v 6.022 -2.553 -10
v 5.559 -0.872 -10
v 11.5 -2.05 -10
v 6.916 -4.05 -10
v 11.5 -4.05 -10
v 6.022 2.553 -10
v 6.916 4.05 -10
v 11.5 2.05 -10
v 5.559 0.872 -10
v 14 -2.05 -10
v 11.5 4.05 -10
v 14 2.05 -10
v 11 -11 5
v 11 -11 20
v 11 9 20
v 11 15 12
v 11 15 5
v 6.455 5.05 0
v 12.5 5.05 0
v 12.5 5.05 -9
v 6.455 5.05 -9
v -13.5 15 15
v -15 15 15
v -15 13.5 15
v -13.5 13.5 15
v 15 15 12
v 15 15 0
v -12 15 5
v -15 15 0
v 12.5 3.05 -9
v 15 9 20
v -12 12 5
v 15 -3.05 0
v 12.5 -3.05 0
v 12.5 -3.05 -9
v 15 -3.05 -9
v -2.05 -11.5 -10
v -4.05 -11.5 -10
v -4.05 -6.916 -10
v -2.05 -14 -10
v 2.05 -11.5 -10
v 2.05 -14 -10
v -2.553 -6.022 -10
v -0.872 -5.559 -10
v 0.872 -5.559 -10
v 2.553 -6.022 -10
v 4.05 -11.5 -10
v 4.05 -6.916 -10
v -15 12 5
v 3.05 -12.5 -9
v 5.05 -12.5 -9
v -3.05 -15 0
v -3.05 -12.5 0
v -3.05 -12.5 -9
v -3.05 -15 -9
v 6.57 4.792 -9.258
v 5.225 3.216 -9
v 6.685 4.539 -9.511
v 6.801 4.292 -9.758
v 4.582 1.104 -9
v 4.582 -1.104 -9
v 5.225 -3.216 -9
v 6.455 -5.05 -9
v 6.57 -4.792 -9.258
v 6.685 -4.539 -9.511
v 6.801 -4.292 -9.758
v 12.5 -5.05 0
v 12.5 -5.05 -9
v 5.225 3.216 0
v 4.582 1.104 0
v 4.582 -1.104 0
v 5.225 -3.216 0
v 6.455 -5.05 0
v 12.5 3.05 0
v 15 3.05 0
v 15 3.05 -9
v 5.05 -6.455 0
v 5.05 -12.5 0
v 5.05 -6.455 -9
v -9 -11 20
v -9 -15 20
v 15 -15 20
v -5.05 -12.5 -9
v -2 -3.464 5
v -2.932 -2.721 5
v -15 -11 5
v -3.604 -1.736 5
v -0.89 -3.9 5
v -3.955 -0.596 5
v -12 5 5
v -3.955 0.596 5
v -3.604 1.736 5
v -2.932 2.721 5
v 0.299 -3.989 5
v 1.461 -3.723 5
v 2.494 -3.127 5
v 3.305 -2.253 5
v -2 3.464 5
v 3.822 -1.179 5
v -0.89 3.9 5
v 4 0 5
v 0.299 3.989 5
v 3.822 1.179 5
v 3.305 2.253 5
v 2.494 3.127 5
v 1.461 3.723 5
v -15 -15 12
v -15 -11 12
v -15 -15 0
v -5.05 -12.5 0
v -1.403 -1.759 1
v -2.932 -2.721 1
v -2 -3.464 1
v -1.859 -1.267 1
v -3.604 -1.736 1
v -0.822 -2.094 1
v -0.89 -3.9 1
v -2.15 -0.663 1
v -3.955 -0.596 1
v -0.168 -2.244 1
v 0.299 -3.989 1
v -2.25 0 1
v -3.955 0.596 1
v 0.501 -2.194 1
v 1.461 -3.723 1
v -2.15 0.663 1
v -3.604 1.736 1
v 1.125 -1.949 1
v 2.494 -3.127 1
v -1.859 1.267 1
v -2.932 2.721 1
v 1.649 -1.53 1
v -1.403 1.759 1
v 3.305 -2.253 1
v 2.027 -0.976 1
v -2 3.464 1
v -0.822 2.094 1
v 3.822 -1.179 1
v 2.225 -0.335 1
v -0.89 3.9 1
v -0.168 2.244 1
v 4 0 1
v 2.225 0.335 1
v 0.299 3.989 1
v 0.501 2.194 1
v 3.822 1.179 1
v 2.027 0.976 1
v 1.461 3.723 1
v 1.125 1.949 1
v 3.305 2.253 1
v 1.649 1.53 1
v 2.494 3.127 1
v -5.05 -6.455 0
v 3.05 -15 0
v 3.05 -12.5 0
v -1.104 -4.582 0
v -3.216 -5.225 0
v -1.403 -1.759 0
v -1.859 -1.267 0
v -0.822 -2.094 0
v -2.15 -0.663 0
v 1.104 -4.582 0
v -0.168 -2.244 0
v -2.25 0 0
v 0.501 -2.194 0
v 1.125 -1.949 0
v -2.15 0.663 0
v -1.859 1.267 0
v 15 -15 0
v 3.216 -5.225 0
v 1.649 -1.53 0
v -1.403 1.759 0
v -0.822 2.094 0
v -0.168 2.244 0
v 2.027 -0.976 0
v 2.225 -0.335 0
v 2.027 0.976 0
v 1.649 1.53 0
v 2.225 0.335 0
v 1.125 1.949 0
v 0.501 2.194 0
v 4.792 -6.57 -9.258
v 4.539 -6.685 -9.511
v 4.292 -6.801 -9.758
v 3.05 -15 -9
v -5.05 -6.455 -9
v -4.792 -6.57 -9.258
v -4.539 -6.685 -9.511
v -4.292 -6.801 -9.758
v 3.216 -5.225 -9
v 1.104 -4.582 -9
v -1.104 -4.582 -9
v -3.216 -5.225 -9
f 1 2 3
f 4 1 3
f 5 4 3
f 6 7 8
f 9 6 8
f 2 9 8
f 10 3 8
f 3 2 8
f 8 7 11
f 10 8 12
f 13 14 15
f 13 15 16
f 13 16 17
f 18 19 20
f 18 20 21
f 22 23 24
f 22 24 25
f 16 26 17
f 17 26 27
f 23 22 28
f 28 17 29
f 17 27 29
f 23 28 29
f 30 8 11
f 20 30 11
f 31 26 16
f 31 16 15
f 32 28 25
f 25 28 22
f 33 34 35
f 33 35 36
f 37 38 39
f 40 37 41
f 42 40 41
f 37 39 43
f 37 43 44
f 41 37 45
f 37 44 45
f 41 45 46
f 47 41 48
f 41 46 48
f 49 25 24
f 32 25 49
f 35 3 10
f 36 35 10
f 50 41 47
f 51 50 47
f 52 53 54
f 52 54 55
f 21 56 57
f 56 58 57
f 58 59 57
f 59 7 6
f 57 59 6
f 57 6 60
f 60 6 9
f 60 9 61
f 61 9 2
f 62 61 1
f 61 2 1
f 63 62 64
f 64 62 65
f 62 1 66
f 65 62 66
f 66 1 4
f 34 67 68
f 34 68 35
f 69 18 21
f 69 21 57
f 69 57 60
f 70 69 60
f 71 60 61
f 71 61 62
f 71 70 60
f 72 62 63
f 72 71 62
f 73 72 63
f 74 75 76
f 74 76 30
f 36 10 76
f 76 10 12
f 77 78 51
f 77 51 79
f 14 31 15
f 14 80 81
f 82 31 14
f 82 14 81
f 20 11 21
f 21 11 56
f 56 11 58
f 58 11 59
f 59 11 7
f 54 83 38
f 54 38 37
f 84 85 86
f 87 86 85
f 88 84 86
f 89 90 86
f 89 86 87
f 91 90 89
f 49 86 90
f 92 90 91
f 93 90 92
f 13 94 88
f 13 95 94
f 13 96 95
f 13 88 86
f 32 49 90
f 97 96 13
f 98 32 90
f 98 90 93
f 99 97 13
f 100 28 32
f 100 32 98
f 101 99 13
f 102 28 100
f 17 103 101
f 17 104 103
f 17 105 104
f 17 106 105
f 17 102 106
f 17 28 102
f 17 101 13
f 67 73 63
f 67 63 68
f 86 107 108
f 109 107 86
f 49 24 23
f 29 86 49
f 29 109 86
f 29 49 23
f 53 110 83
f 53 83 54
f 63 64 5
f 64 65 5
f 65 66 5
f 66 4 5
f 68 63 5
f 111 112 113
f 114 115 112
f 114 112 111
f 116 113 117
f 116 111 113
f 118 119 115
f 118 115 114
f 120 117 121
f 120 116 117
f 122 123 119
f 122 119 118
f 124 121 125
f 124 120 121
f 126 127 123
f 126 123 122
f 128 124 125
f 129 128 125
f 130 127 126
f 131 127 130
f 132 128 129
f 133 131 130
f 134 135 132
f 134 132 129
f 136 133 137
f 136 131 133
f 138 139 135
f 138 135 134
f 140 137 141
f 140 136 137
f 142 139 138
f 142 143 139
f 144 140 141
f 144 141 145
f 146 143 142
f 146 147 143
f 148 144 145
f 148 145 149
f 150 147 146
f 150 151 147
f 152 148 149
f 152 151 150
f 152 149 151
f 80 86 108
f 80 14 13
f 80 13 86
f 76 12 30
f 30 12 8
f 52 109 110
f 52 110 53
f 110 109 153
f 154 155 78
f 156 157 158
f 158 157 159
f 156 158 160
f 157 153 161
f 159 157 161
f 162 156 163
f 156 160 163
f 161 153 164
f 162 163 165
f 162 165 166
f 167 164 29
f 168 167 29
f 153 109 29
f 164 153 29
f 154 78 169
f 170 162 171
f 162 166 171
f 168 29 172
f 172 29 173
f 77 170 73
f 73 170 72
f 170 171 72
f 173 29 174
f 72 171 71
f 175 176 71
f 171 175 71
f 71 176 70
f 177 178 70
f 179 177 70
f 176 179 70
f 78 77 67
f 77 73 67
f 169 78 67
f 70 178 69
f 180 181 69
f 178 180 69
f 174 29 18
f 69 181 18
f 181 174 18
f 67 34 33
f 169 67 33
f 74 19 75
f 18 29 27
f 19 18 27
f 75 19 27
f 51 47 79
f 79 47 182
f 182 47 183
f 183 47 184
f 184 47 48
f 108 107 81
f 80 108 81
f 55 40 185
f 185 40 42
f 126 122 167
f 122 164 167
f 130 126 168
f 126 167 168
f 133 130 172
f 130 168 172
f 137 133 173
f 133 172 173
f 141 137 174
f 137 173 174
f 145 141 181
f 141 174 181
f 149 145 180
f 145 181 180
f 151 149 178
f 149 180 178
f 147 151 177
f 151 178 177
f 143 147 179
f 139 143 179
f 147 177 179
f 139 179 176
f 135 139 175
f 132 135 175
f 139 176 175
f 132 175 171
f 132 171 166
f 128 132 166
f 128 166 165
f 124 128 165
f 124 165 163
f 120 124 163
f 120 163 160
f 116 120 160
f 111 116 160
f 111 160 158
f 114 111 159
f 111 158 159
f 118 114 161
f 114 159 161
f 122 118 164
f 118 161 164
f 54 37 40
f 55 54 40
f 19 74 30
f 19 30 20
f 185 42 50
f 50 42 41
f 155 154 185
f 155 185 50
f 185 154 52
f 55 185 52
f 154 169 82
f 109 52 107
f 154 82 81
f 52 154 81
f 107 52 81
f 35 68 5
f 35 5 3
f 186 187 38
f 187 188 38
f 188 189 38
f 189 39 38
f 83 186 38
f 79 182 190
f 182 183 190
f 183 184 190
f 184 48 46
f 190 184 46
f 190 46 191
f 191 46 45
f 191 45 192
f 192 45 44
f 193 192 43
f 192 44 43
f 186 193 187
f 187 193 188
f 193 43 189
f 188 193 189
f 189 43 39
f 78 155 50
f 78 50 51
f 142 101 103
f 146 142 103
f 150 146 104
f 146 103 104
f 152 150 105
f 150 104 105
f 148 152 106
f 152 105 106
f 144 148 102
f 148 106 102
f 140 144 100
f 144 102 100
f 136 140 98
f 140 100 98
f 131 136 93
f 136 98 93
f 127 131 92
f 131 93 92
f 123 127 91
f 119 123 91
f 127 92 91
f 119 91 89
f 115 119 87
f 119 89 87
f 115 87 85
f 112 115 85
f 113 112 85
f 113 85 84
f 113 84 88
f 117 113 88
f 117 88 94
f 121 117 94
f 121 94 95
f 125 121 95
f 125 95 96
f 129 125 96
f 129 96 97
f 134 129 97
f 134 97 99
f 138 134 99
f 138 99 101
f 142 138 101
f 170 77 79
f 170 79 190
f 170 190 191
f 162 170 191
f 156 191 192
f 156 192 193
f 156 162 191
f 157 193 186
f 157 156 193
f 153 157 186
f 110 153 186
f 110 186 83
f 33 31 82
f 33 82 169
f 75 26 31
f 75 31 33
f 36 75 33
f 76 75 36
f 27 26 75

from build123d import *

# Parameters (mm, degrees)
SKETCH_1_W                   = 30
SKETCH_1_H                   = 30
EXTRUDE_1_DEPTH              = 5
SKETCH_2_W                   = 3
SKETCH_2_H                   = 3
EXTRUDE_2_DEPTH              = 10
EXTRUDE_3_DEPTH              = 7
CUT_EXTRUDE_1_DEPTH          = 10
CUT_EXTRUDE_2_DEPTH          = 10
HOLE_WIZARD_M4_1_D           = 4.5
HOLE_WIZARD_M4_1_CBORE_D     = 8
HOLE_WIZARD_M4_1_CBORE_DEPTH = 4
EXTRUDE_4_DEPTH              = 10
CHAMFER_1_SIZE               = 1
CUT_EXTRUDE_4_DEPTH          = 10
EXTRUDE_5_DEPTH              = 4
EXTRUDE_6_DEPTH              = 4


with BuildPart() as part:
    # 스케치1 → 보스-돌출1 (new body)
    with BuildSketch(Plane.XY):
        Rectangle(SKETCH_1_W, SKETCH_1_H)
    extrude(amount=EXTRUDE_1_DEPTH)

    # 스케치2 → 보스-돌출2 (add)
    with BuildSketch(Plane.XY.offset(5)):
        with Locations((-13.5, 13.5)):
            Rectangle(SKETCH_2_W, SKETCH_2_H)
    extrude(amount=EXTRUDE_2_DEPTH)

    # 스케치2<3> → 보스-돌출3 (add)
    with BuildSketch(Plane.XY.offset(5)):
        Polygon((15, 15), (11, 15), (11, -11), (-15, -11), (-15, -15), (15, -15), align=None)
    extrude(amount=EXTRUDE_3_DEPTH)

    # 스케치3 → 컷-돌출1 (cut)
    with BuildSketch(Plane(origin=(-12, 0, 0), x_dir=(0, 0, -1), z_dir=(1, 0, 0))):
        Polygon((-15, 13.5), (-5, 12), (-15, 12), align=None)
    extrude(amount=-CUT_EXTRUDE_1_DEPTH, mode=Mode.SUBTRACT)

    # 스케치4 → 컷-돌출2 (cut)
    with BuildSketch(Plane(origin=(0, 15, 0), x_dir=(1, 0, 0), z_dir=(0, 1, 0))):
        Polygon((-12, -15), (-12, -5), (-13.5, -15), align=None)
    extrude(amount=-CUT_EXTRUDE_2_DEPTH, mode=Mode.SUBTRACT)

    # M4 소켓 머리 캡 나사용 카운터보어1 (through all)
    with Locations(Plane.XY.offset(5)):
        with Locations((0, 0)):
            CounterBoreHole(HOLE_WIZARD_M4_1_D / 2, HOLE_WIZARD_M4_1_CBORE_D / 2, HOLE_WIZARD_M4_1_CBORE_DEPTH)

    # 스케치8 → 보스-돌출4 (add)
    with BuildSketch(Plane(origin=(0, 0, 0), x_dir=(-1, 0, 0), z_dir=(0, 0, -1))):
        with BuildLine():
            Line((-3.05, 15), (3.05, 15))
            Line((3.05, 15), (3.05, 12.5))
            Line((3.05, 12.5), (5.05, 12.5))
            Line((5.05, 12.5), (5.05, 6.454957169))
            ThreePointArc((5.05, 6.454957169), (0, 4.5), (-5.05, 6.454957169))
            Line((-5.05, 6.454957169), (-5.05, 12.5))
            Line((-5.05, 12.5), (-3.05, 12.5))
            Line((-3.05, 12.5), (-3.05, 15))
        make_face()
        with BuildLine():
            Line((15, 3.05), (15, -3.05))
            Line((15, -3.05), (12.5, -3.05))
            Line((12.5, -3.05), (12.5, -5.05))
            Line((12.5, -5.05), (6.454957169, -5.05))
            ThreePointArc((6.454957169, -5.05), (4.5, 0), (6.454957169, 5.05))
            Line((6.454957169, 5.05), (12.5, 5.05))
            Line((12.5, 5.05), (12.5, 3.05))
            Line((12.5, 3.05), (15, 3.05))
        make_face()
        with BuildLine():
            Line((3.05, -15), (-3.05, -15))
            Line((-3.05, -15), (-3.05, -12.5))
            Line((-3.05, -12.5), (-5.05, -12.5))
            Line((-5.05, -12.5), (-5.05, -6.454957169))
            ThreePointArc((-5.05, -6.454957169), (0, -4.5), (5.05, -6.454957169))
            Line((5.05, -6.454957169), (5.05, -12.5))
            Line((5.05, -12.5), (3.05, -12.5))
            Line((3.05, -12.5), (3.05, -15))
        make_face()
        with BuildLine():
            Line((-15, -3.05), (-15, 3.05))
            Line((-15, 3.05), (-12.5, 3.05))
            Line((-12.5, 3.05), (-12.5, 5.05))
            Line((-12.5, 5.05), (-6.454957169, 5.05))
            ThreePointArc((-6.454957169, 5.05), (-4.5, 0), (-6.454957169, -5.05))
            Line((-6.454957169, -5.05), (-12.5, -5.05))
            Line((-12.5, -5.05), (-12.5, -3.05))
            Line((-12.5, -3.05), (-15, -3.05))
        make_face()
    extrude(amount=EXTRUDE_4_DEPTH)

    # 모따기1
    chamfer_1_edges = [part.edges().sort_by_distance(p)[0] for p in [
        (-13.75, -3.05, -10),
        (-15, 0, -10),
        (-13.75, 3.05, -10),
        (-12.5, 4.05, -10),
        (-9.477478584, 5.05, -10),
        (-4.5, 0, -10),
        (-9.477478584, -5.05, -10),
        (-12.5, -4.05, -10),
        (3.05, -13.75, -10),
        (0, -15, -10),
        (-3.05, -13.75, -10),
        (-4.05, -12.5, -10),
        (-5.05, -9.477478584, -10),
        (0, -4.5, -10),
        (5.05, -9.477478584, -10),
        (4.05, -12.5, -10),
        (13.75, 3.05, -10),
        (15, 0, -10),
        (13.75, -3.05, -10),
        (12.5, -4.05, -10),
        (9.477478584, -5.05, -10),
        (4.5, 0, -10),
        (9.477478584, 5.05, -10),
        (12.5, 4.05, -10),
        (-3.05, 13.75, -10),
        (0, 15, -10),
        (3.05, 13.75, -10),
        (4.05, 12.5, -10),
        (5.05, 9.477478584, -10),
        (0, 4.5, -10),
        (-5.05, 9.477478584, -10),
        (-4.05, 12.5, -10),
    ]]
    chamfer(chamfer_1_edges, length=CHAMFER_1_SIZE)

    # 스케치9 → 컷-돌출4 (cut)
    with BuildSketch(Plane(origin=(0, 0, -10), x_dir=(-1, 0, 0), z_dir=(0, 0, -1))):
        Polygon((-6.459146565, 15), (-6.459146565, 5.734562816), (1.656191427, 2.380775176), (5.83807478, -6.065801101), (15, -6.065801101), (15, 15), align=None)
    extrude(amount=-CUT_EXTRUDE_4_DEPTH, mode=Mode.SUBTRACT)

    # 스케치11 → 보스-돌출5 (add)
    with BuildSketch(Plane.XZ.offset(15)):
        Polygon((-15, 12), (-9, 20), (15, 20), (15, 12), align=None)
    extrude(amount=-EXTRUDE_5_DEPTH)

    # 스케치12 → 보스-돌출6 (add)
    with BuildSketch(Plane(origin=(15, 0, 0), x_dir=(0, 0, -1), z_dir=(1, 0, 0))):
        Polygon((-12, -11), (-12, 15), (-20, 9), (-20, -11), align=None)
    extrude(amount=-EXTRUDE_6_DEPTH)


solid = part.part
